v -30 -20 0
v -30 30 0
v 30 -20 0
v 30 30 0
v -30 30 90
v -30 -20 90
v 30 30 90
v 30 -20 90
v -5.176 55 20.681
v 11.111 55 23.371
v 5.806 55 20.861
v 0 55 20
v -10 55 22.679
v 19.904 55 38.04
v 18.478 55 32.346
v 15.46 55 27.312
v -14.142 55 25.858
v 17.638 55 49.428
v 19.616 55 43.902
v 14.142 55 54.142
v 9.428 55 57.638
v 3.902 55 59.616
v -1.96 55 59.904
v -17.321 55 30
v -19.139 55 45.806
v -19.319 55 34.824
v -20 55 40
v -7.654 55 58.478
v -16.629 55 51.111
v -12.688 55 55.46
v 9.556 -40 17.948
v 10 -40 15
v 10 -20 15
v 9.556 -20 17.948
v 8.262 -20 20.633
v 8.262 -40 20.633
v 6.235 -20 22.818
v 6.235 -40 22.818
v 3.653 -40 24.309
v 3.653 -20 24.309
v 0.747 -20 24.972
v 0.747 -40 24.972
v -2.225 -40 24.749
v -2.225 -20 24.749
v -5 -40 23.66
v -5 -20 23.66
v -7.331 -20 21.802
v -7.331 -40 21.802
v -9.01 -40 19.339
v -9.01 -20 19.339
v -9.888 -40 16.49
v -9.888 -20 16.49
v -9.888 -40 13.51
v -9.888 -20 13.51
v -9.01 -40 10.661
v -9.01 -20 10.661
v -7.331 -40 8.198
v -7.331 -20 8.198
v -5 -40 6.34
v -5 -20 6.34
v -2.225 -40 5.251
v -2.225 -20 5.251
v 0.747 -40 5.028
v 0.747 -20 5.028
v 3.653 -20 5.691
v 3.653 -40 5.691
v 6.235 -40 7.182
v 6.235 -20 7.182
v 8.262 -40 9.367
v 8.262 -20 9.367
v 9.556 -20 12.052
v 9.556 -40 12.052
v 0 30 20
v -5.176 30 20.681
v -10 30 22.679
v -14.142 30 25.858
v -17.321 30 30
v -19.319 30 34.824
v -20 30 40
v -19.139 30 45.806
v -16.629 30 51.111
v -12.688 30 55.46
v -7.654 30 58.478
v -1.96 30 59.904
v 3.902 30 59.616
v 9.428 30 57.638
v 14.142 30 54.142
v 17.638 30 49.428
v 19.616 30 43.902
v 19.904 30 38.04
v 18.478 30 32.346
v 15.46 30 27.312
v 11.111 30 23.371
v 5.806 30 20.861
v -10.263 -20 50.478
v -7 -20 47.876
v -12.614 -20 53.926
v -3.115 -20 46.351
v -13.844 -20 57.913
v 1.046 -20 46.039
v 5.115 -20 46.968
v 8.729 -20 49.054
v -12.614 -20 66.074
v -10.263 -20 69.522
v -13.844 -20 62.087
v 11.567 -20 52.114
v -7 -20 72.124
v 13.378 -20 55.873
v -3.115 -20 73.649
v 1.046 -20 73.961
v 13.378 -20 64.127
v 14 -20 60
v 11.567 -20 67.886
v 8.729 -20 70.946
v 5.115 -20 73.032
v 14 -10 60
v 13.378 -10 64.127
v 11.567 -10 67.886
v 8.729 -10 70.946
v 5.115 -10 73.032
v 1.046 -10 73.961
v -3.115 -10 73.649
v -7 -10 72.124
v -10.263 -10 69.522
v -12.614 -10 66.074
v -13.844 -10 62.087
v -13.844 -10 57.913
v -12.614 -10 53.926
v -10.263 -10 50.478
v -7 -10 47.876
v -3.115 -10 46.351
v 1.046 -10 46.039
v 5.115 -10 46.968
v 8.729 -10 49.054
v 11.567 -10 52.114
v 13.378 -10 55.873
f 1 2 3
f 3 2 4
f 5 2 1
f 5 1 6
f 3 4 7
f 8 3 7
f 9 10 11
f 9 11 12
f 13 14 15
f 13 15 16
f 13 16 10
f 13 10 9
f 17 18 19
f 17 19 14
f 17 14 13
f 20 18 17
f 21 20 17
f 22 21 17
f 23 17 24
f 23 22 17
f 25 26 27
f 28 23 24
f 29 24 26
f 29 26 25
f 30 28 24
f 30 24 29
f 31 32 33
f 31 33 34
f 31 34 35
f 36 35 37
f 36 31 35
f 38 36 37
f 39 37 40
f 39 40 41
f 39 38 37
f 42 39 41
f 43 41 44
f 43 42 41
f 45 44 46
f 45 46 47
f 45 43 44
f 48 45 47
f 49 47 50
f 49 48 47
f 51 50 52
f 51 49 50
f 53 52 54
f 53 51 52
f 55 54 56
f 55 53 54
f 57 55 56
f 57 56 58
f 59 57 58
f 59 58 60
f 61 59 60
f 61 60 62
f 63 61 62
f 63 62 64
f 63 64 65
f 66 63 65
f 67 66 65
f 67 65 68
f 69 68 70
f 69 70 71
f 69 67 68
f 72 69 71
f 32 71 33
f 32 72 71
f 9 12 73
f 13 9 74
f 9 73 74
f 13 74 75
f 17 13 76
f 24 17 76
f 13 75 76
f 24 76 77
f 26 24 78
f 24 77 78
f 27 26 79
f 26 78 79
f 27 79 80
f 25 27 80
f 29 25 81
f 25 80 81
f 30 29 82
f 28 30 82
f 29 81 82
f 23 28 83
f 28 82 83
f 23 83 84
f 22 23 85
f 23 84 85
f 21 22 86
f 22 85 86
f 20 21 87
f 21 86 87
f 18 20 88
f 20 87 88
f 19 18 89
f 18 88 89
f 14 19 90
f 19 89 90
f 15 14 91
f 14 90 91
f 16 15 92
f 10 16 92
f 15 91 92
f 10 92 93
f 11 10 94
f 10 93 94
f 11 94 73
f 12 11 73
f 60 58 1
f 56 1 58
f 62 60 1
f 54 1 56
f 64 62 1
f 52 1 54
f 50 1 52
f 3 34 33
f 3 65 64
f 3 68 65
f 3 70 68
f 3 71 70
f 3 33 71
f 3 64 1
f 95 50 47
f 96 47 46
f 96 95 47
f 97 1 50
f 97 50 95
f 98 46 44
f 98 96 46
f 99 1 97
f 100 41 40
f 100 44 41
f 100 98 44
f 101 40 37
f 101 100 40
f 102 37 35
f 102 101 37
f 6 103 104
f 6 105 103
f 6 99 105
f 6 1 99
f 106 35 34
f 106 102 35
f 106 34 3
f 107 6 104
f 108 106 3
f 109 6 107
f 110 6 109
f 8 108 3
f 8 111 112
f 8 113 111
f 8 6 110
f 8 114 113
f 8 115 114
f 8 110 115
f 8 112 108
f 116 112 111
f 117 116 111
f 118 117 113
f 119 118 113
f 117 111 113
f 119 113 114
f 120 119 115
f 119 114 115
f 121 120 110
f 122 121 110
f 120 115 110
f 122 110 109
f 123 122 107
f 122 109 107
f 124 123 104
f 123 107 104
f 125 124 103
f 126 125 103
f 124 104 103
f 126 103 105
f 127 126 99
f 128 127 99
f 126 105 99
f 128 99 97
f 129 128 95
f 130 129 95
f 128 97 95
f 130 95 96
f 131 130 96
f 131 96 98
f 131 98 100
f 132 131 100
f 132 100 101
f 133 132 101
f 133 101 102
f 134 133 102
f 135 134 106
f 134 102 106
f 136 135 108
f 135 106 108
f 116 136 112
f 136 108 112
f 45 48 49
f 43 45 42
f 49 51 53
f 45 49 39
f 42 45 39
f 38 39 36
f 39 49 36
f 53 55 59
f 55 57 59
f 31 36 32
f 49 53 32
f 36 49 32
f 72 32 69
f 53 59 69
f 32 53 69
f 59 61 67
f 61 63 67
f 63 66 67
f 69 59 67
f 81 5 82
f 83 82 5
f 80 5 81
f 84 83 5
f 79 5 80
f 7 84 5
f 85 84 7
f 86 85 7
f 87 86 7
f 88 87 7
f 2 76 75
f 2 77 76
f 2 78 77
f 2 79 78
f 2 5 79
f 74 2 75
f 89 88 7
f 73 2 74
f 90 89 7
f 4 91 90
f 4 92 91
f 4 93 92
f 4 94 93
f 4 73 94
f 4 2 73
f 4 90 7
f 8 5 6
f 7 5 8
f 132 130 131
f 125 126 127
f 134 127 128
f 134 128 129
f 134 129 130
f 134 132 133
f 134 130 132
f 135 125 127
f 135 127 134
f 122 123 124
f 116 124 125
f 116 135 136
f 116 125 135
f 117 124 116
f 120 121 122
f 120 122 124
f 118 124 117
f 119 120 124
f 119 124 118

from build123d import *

# Parameters (mm, degrees)
F0_W     = 60
F0_H     = 60
F1_DEPTH = 90
F2_DEPTH = 10
F4_DEPTH = 25
F5_W     = 60
F5_H     = 90
F5_R     = 10
F6_DEPTH = 20
F7_R     = 14
F8_DEPTH = 10


with BuildPart() as f1:
    # F0 (on Top) → F1 (new body)
    with BuildSketch(Plane.XY):
        Rectangle(F0_W, F0_H)
    extrude(amount=F1_DEPTH)

    # F2 (add): a face of the model
    f2_faces = [f1.faces().sort_by_distance(p)[0] for p in [
        (0, -30, 45),
    ]]
    extrude(f2_faces, amount=F2_DEPTH)

    # F3 (on face) → F4 (join)
    with BuildSketch(Plane(origin=(0, 30, 0), x_dir=(-1, 0, 0), z_dir=(0, 1, 0))):
        with BuildLine():
            ThreePointArc((0, 20), (14.1421356237, 25.8578643763), (20, 40))
            ThreePointArc((20, 40), (-14.1421356237, 54.1421356237), (0, 20))
        make_face()
    extrude(amount=F4_DEPTH)

    # F5 (on face) → F6 (cut)
    with BuildSketch(Plane.XZ.offset(40)):
        with Locations((0, 45)):
            Rectangle(F5_W, F5_H)
        with Locations((0, 15)):
            Circle(F5_R, mode=Mode.SUBTRACT)
    extrude(amount=-F6_DEPTH, mode=Mode.SUBTRACT)

    # F7 (on face) → F8 (cut)
    with BuildSketch(Plane.XZ.offset(20)):
        with Locations((0, 60)):
            Circle(F7_R)
    extrude(amount=-F8_DEPTH, mode=Mode.SUBTRACT)


solid = f1.part
